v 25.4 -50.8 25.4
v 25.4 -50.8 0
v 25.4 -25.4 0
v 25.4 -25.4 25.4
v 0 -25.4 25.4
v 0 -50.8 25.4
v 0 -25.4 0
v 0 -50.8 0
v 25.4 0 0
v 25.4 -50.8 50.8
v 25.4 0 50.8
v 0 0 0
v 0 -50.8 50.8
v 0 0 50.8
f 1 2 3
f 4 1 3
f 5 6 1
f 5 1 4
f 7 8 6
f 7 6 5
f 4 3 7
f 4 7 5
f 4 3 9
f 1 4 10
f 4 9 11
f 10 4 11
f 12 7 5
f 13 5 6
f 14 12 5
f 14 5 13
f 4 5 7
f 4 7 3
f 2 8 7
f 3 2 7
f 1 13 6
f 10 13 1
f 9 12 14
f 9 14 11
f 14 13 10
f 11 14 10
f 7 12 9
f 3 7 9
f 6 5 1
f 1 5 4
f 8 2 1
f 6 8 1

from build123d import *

# Parameters (mm, degrees)
F0_W     = 25.4
F0_H     = 50.8
F1_DEPTH = 25.4
F2_W     = 25.4
F2_H     = 25.4
F3_DEPTH = 25.4
F4_W     = 25.4
F4_H     = 25.4
F5_DEPTH = 25.4


with BuildPart() as f1:
    # F0 (on Front) → F1 (new body)
    with BuildSketch(Plane.XZ):
        with Locations((12.7, 25.4)):
            Rectangle(F0_W, F0_H)
    extrude(amount=F1_DEPTH)

    # F2 (on face) → F3 (join)
    with BuildSketch(Plane.XZ.offset(25.4)):
        with Locations((12.7, 38.1)):
            Rectangle(F2_W, F2_H)
    extrude(amount=F3_DEPTH)


with BuildPart() as f5:
    # F4 (on face) → F5 (new body)
    with BuildSketch(Plane.YZ.offset(25.4)):
        with Locations((-38.1, 12.7)):
            Rectangle(F4_W, F4_H)
    extrude(amount=-F5_DEPTH)


solid = Compound([f1.part, f5.part])
